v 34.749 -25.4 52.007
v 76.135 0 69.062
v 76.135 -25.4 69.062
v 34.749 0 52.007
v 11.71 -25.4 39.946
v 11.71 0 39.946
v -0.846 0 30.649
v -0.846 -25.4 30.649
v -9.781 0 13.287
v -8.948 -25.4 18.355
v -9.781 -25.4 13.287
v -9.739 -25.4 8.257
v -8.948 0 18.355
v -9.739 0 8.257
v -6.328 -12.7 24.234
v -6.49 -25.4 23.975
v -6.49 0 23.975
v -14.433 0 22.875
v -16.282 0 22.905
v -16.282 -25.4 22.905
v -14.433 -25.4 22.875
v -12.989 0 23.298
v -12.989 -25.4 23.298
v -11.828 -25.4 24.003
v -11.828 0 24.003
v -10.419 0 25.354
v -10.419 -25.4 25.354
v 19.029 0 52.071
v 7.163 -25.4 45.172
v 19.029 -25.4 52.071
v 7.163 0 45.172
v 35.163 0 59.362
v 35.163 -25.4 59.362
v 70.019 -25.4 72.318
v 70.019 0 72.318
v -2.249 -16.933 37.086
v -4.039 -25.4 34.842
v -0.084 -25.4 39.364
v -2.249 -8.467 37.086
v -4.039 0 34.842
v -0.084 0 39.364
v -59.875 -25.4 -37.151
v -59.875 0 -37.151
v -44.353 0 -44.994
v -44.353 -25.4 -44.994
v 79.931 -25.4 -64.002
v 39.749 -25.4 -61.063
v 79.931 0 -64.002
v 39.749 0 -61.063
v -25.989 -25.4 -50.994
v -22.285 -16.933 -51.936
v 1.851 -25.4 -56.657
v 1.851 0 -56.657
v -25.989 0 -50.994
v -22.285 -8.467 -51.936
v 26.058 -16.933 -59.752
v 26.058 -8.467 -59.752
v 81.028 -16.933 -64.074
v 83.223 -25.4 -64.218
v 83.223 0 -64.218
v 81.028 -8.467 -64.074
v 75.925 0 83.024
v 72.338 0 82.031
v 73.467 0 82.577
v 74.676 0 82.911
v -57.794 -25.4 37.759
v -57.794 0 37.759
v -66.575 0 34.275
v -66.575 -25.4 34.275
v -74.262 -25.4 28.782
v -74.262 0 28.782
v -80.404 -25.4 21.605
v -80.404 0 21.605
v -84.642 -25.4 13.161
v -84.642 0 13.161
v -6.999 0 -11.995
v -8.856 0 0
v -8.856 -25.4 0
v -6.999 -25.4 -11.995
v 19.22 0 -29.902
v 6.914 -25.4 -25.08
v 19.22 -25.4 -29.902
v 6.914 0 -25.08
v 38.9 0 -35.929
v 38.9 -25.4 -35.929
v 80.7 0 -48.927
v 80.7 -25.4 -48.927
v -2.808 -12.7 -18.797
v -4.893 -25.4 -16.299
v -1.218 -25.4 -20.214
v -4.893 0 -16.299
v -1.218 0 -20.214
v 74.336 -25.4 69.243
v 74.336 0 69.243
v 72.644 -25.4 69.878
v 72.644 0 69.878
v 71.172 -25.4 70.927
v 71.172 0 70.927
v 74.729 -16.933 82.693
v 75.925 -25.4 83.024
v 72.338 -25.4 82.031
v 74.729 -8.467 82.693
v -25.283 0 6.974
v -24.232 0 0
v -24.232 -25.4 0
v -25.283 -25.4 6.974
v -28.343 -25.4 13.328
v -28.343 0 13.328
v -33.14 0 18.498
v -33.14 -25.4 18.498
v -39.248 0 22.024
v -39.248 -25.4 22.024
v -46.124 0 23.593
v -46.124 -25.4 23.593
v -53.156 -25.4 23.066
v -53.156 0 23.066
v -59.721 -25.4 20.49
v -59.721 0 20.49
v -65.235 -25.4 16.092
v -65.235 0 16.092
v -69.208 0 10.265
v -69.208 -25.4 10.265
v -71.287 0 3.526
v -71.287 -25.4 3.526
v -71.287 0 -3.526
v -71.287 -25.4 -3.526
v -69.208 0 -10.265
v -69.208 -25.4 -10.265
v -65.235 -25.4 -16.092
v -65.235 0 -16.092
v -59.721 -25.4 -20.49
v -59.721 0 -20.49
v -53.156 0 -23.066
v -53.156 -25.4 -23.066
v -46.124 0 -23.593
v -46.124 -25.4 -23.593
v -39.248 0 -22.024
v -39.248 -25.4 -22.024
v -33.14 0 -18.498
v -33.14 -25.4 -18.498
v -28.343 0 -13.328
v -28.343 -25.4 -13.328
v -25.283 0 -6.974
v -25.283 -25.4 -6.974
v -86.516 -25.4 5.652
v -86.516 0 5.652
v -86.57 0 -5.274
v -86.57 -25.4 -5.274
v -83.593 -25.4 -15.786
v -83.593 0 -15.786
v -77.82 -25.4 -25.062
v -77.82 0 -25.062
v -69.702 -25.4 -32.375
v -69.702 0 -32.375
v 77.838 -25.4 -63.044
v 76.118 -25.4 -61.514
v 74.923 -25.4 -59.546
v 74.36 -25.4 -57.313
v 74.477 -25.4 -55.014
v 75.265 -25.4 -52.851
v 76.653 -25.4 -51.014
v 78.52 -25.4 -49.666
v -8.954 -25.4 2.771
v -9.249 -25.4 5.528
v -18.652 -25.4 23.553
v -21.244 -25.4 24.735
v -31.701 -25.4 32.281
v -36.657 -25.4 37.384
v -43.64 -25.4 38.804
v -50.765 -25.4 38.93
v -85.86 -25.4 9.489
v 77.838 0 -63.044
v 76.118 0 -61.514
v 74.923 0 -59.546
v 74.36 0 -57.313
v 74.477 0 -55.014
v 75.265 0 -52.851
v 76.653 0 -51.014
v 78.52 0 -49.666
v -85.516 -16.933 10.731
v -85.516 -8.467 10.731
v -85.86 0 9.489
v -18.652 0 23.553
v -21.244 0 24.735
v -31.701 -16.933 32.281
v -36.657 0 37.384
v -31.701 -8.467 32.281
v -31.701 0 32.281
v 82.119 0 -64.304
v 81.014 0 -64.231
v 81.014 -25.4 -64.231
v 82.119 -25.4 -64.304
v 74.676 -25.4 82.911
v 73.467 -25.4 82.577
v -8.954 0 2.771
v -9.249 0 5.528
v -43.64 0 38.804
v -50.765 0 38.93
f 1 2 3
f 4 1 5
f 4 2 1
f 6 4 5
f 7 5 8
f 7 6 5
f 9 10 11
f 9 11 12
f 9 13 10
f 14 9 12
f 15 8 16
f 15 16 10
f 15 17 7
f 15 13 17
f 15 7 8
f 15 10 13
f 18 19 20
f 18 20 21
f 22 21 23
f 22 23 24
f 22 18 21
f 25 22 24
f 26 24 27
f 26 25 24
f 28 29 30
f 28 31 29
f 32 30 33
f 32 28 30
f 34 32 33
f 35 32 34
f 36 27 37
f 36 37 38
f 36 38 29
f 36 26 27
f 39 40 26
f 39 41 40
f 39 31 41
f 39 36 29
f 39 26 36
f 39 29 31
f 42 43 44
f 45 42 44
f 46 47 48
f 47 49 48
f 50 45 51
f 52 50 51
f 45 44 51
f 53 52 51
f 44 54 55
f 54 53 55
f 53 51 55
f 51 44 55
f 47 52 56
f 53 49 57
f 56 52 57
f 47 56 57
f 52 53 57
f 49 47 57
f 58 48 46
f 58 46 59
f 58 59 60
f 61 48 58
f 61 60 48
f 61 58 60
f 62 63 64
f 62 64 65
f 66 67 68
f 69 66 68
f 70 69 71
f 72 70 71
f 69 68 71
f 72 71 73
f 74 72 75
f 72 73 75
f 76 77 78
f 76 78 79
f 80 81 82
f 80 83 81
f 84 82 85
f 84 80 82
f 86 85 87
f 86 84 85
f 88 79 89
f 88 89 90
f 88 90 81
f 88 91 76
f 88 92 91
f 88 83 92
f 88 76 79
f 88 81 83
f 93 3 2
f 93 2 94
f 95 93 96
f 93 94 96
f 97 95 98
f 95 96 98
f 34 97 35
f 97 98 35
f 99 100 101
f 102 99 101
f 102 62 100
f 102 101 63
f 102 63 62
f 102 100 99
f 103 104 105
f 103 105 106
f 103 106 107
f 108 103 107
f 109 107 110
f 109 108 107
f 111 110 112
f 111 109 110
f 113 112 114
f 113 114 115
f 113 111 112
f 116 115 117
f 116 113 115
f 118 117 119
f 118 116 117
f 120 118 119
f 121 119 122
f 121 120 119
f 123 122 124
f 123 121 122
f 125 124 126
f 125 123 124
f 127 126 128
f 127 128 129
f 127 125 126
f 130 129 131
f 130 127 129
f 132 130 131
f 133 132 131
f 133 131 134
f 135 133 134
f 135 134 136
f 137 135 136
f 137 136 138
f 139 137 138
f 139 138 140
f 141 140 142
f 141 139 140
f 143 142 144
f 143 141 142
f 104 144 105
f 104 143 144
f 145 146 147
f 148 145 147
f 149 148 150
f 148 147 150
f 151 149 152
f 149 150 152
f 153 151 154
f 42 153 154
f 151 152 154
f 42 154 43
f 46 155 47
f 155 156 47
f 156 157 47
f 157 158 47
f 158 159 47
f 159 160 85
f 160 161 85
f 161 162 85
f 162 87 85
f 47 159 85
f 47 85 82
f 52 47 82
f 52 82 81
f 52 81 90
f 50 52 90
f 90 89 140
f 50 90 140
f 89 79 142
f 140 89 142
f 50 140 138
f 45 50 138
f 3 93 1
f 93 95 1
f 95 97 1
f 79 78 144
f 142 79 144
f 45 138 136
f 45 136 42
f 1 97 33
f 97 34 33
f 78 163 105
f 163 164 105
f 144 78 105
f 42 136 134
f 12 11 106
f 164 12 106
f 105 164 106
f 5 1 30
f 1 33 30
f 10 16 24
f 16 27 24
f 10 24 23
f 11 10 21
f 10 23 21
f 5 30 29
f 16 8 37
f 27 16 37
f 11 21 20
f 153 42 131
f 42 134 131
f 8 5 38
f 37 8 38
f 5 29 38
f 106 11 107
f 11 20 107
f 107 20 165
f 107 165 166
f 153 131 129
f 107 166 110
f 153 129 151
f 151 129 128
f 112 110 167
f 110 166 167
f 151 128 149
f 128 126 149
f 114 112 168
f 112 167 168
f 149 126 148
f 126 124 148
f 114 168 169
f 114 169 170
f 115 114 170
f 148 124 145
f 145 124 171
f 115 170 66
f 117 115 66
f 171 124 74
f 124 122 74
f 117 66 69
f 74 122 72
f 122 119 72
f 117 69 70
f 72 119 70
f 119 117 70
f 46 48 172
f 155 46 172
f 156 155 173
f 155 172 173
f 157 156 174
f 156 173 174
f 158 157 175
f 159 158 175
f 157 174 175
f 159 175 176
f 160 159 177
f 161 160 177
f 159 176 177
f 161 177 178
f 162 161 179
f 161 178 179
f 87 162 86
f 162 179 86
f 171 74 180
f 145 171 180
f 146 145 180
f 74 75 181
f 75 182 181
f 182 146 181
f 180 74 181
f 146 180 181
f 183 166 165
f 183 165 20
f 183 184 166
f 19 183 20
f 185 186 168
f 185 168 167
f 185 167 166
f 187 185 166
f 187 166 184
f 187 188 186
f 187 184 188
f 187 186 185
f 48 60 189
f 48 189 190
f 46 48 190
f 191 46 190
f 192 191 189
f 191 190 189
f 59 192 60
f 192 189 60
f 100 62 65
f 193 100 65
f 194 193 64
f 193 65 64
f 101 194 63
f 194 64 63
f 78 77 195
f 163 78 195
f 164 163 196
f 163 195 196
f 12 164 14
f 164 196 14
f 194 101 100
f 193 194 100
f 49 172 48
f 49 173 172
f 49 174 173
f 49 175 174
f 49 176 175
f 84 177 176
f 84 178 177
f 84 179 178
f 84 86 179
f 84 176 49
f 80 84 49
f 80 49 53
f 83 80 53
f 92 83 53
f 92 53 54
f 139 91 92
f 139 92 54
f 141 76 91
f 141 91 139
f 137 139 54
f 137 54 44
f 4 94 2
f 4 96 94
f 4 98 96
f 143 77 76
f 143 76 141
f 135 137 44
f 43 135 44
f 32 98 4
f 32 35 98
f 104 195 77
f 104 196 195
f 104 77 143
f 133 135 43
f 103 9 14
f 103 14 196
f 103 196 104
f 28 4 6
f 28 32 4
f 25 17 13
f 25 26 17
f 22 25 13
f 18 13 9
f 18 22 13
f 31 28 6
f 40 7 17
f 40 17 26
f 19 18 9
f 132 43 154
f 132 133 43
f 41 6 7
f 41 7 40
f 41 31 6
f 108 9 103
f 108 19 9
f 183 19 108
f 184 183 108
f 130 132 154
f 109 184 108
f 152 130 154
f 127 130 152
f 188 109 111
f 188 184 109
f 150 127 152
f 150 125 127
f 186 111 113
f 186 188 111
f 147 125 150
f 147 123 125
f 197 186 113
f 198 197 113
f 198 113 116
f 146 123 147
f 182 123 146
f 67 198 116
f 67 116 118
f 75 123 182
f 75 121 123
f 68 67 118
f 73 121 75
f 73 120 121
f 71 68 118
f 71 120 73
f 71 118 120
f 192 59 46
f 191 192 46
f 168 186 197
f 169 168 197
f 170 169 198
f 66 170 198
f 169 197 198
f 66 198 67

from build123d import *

# Parameters (mm, degrees)
F1_DEPTH = 25.4
F0_R     = 23.6593869312


with BuildPart() as f1:
    # F0 (on Front) → F1 (new body)
    with BuildSketch(Plane.XZ):
        with BuildLine():
            add(Edge.make_bspline(
                [(75.9254321456, 83.0235277666), (74.7294280544, 82.6927874869), (73.5334280539, 82.3620352717), (72.3376928193, 82.0312405203)],
                knots=[0, 0, 0, 0, 0.0073316061, 0.0073316061, 0.0073316061, 0.0073316061], degree=3))
            ThreePointArc((75.9254321456, 83.0235277666), (74.0642156447, 82.7708851046), (72.3376928194, 82.0312405203))
        make_face()
    extrude(amount=F1_DEPTH)


with BuildPart() as f1b:
    # F0 (on Front) → F1, piece 2 (new body)
    with BuildSketch(Plane.XZ):
        with BuildLine():
            add(Edge.make_bspline(
                [(76.1346470657, 69.0624530107), (40.7292389403, 55.4358728105), (-8.4882690711, 35.1479862328), (-10.0969930291, 13.5229108802), (-9.7391861118, 8.2574256301)],
                knots=[0, 0, 0, 0, 0.3400525355, 0.4531553438, 0.4531553438, 0.4531553438, 0.4531553438], degree=3))
            ThreePointArc((76.1346470657, 69.0624530107), (72.6443374796, 69.8782898329), (70.0187498647, 72.3184005689))
            add(Edge.make_bspline(
                [(-16.28206518, 22.9048247821), (-15.9978816605, 22.8614061319), (-9.847888416, 22.2541104927), (-4.9630436623, 45.7648826483), (39.9145521125, 61.6532519518), (70.0187498647, 72.3184005689)],
                knots=[0.6107795309, 0.6107795309, 0.6107795309, 0.6107795309, 0.6167186955, 0.7430558298, 1, 1, 1, 1], degree=3))
            ThreePointArc((-16.28206518, 22.9048247821), (-12.2500691202, 15.9208598799), (-9.7391861118, 8.2574256301))
        make_face()
        with BuildLine():
            add(Edge.make_bspline(
                [(-9.7391861118, 8.2574256301), (-9.5488772889, 5.4568417072), (-9.1437609317, 2.6935729525), (-8.8558278998, 0)],
                knots=[0.4531553438, 0.4531553438, 0.4531553438, 0.4531553438, 0.513311985, 0.513311985, 0.513311985, 0.513311985], degree=3))
            ThreePointArc((-9.7391861118, 8.2574256301), (-12.2500691202, 15.9208598799), (-16.28206518, 22.9048247821))
            add(Edge.make_bspline(
                [(-36.6569671608, 37.3842575617), (-34.0559655004, 33.839361088), (-22.9517472418, 23.9238444403), (-16.28206518, 22.9048247821)],
                knots=[0.4713895345, 0.4713895345, 0.4713895345, 0.4713895345, 0.6107795309, 0.6107795309, 0.6107795309, 0.6107795309], degree=3))
            ThreePointArc((-36.6569671608, 37.3842575617), (-47.1995868952, 39.0297823491), (-57.7939230416, 37.7591036685))
            add(Edge.make_bspline(
                [(-57.7939230416, 37.7591036685), (-71.2879137352, 30.3920746047), (-80.7433533788, 22.546843239), (-84.6419629659, 13.1614831137)],
                knots=[0.3158866582, 0.3158866582, 0.3158866582, 0.3158866582, 0.4548873169, 0.4548873169, 0.4548873169, 0.4548873169], degree=3))
            ThreePointArc((-84.6419629659, 13.1614831137), (-85.7657136885, 9.453341157), (-86.5163145506, 5.6520610039))
            add(Edge.make_bspline(
                [(-86.5163145506, 5.6520610039), (-87.8220049343, -8.256393814), (-78.1636088875, -25.5056272441), (-59.8753358981, -37.1509972704)],
                knots=[0.4903848461, 0.4903848461, 0.4903848461, 0.4903848461, 0.6791592516, 0.6791592516, 0.6791592516, 0.6791592516], degree=3))
            ThreePointArc((-59.8753358981, -37.1509972704), (-24.9133595896, -31.5562465868), (-8.8558278998, 0))
        make_face()
        with Locations((-47.8917472064, 0)):
            Circle(F0_R, mode=Mode.SUBTRACT)
        with BuildLine():
            ThreePointArc((-8.8558278998, 0), (-9.0772956945, 4.1522704562), (-9.7391861118, 8.2574256301))
            add(Edge.make_bspline(
                [(-9.7391861118, 8.2574256301), (-9.5488772889, 5.4568417072), (-9.1437609317, 2.6935729525), (-8.8558278998, 0)],
                knots=[0.4531553438, 0.4531553438, 0.4531553438, 0.4531553438, 0.513311985, 0.513311985, 0.513311985, 0.513311985], degree=3))
        make_face()
        with BuildLine():
            add(Edge.make_bspline(
                [(-57.7939230416, 37.7591036685), (-71.2879137352, 30.3920746047), (-80.7433533788, 22.546843239), (-84.6419629659, 13.1614831137)],
                knots=[0.3158866582, 0.3158866582, 0.3158866582, 0.3158866582, 0.4548873169, 0.4548873169, 0.4548873169, 0.4548873169], degree=3))
            ThreePointArc((-57.7939230416, 37.7591036685), (-74.2616570397, 28.7824747286), (-84.6419629659, 13.1614831137))
        make_face()
        with BuildLine():
            add(Edge.make_bspline(
                [(-8.8558278998, 0), (-8.1092874361, -6.9837808721), (-8.2378825667, -27.3137566504), (44.0538892813, -35.7910694427), (80.699708097, -48.9266225955)],
                knots=[0.513311985, 0.513311985, 0.513311985, 0.513311985, 0.669283554, 1, 1, 1, 1], degree=3))
            ThreePointArc((-8.8558278998, 0), (-24.9133595896, -31.5562465868), (-59.8753358981, -37.1509972704))
            add(Edge.make_bspline(
                [(-59.8753358981, -37.1509972704), (-29.4016014528, -56.5556678974), (25.033443589, -60.4009148555), (79.9312097407, -64.0020462349)],
                knots=[0.6791592516, 0.6791592516, 0.6791592516, 0.6791592516, 0.9937138904, 0.9937138904, 0.9937138904, 0.9937138904], degree=3))
            ThreePointArc((79.9312097407, -64.0020462349), (74.3325035366, -56.1593418997), (80.699708097, -48.9266225955))
        make_face()
        with BuildLine():
            ThreePointArc((-86.5163145506, 5.6520610039), (-85.7657136885, 9.453341157), (-84.6419629659, 13.1614831137))
            add(Edge.make_bspline(
                [(-84.6419629659, 13.1614831137), (-85.637577009, 10.7646808353), (-86.2707898333, 8.2674355824), (-86.5163145506, 5.6520610039)],
                knots=[0.4548873169, 0.4548873169, 0.4548873169, 0.4548873169, 0.4903848461, 0.4903848461, 0.4903848461, 0.4903848461], degree=3))
        make_face()
        with BuildLine():
            ThreePointArc((-86.5163145506, 5.6520610039), (-81.0326858435, -20.6271952134), (-59.8753358981, -37.1509972704))
            add(Edge.make_bspline(
                [(-86.5163145506, 5.6520610039), (-87.8220049343, -8.256393814), (-78.1636088875, -25.5056272441), (-59.8753358981, -37.1509972704)],
                knots=[0.4903848461, 0.4903848461, 0.4903848461, 0.4903848461, 0.6791592516, 0.6791592516, 0.6791592516, 0.6791592516], degree=3))
        make_face()
    extrude(amount=F1_DEPTH)


with BuildPart() as f1c:
    # F0 (on Front) → F1, piece 3 (new body)
    with BuildSketch(Plane.XZ):
        with BuildLine():
            add(Edge.make_bspline(
                [(79.9312097407, -64.0020462349), (81.0282953659, -64.0740118129), (82.1255657864, -64.1458798992), (83.2228334599, -64.2177727256)],
                knots=[0.9937138904, 0.9937138904, 0.9937138904, 0.9937138904, 1, 1, 1, 1], degree=3))
            ThreePointArc((79.9312097407, -64.0020462349), (81.5654106231, -64.2870734798), (83.2228334599, -64.2177727256))
        make_face()
    extrude(amount=F1_DEPTH)


solid = Compound([f1.part, f1b.part, f1c.part])
